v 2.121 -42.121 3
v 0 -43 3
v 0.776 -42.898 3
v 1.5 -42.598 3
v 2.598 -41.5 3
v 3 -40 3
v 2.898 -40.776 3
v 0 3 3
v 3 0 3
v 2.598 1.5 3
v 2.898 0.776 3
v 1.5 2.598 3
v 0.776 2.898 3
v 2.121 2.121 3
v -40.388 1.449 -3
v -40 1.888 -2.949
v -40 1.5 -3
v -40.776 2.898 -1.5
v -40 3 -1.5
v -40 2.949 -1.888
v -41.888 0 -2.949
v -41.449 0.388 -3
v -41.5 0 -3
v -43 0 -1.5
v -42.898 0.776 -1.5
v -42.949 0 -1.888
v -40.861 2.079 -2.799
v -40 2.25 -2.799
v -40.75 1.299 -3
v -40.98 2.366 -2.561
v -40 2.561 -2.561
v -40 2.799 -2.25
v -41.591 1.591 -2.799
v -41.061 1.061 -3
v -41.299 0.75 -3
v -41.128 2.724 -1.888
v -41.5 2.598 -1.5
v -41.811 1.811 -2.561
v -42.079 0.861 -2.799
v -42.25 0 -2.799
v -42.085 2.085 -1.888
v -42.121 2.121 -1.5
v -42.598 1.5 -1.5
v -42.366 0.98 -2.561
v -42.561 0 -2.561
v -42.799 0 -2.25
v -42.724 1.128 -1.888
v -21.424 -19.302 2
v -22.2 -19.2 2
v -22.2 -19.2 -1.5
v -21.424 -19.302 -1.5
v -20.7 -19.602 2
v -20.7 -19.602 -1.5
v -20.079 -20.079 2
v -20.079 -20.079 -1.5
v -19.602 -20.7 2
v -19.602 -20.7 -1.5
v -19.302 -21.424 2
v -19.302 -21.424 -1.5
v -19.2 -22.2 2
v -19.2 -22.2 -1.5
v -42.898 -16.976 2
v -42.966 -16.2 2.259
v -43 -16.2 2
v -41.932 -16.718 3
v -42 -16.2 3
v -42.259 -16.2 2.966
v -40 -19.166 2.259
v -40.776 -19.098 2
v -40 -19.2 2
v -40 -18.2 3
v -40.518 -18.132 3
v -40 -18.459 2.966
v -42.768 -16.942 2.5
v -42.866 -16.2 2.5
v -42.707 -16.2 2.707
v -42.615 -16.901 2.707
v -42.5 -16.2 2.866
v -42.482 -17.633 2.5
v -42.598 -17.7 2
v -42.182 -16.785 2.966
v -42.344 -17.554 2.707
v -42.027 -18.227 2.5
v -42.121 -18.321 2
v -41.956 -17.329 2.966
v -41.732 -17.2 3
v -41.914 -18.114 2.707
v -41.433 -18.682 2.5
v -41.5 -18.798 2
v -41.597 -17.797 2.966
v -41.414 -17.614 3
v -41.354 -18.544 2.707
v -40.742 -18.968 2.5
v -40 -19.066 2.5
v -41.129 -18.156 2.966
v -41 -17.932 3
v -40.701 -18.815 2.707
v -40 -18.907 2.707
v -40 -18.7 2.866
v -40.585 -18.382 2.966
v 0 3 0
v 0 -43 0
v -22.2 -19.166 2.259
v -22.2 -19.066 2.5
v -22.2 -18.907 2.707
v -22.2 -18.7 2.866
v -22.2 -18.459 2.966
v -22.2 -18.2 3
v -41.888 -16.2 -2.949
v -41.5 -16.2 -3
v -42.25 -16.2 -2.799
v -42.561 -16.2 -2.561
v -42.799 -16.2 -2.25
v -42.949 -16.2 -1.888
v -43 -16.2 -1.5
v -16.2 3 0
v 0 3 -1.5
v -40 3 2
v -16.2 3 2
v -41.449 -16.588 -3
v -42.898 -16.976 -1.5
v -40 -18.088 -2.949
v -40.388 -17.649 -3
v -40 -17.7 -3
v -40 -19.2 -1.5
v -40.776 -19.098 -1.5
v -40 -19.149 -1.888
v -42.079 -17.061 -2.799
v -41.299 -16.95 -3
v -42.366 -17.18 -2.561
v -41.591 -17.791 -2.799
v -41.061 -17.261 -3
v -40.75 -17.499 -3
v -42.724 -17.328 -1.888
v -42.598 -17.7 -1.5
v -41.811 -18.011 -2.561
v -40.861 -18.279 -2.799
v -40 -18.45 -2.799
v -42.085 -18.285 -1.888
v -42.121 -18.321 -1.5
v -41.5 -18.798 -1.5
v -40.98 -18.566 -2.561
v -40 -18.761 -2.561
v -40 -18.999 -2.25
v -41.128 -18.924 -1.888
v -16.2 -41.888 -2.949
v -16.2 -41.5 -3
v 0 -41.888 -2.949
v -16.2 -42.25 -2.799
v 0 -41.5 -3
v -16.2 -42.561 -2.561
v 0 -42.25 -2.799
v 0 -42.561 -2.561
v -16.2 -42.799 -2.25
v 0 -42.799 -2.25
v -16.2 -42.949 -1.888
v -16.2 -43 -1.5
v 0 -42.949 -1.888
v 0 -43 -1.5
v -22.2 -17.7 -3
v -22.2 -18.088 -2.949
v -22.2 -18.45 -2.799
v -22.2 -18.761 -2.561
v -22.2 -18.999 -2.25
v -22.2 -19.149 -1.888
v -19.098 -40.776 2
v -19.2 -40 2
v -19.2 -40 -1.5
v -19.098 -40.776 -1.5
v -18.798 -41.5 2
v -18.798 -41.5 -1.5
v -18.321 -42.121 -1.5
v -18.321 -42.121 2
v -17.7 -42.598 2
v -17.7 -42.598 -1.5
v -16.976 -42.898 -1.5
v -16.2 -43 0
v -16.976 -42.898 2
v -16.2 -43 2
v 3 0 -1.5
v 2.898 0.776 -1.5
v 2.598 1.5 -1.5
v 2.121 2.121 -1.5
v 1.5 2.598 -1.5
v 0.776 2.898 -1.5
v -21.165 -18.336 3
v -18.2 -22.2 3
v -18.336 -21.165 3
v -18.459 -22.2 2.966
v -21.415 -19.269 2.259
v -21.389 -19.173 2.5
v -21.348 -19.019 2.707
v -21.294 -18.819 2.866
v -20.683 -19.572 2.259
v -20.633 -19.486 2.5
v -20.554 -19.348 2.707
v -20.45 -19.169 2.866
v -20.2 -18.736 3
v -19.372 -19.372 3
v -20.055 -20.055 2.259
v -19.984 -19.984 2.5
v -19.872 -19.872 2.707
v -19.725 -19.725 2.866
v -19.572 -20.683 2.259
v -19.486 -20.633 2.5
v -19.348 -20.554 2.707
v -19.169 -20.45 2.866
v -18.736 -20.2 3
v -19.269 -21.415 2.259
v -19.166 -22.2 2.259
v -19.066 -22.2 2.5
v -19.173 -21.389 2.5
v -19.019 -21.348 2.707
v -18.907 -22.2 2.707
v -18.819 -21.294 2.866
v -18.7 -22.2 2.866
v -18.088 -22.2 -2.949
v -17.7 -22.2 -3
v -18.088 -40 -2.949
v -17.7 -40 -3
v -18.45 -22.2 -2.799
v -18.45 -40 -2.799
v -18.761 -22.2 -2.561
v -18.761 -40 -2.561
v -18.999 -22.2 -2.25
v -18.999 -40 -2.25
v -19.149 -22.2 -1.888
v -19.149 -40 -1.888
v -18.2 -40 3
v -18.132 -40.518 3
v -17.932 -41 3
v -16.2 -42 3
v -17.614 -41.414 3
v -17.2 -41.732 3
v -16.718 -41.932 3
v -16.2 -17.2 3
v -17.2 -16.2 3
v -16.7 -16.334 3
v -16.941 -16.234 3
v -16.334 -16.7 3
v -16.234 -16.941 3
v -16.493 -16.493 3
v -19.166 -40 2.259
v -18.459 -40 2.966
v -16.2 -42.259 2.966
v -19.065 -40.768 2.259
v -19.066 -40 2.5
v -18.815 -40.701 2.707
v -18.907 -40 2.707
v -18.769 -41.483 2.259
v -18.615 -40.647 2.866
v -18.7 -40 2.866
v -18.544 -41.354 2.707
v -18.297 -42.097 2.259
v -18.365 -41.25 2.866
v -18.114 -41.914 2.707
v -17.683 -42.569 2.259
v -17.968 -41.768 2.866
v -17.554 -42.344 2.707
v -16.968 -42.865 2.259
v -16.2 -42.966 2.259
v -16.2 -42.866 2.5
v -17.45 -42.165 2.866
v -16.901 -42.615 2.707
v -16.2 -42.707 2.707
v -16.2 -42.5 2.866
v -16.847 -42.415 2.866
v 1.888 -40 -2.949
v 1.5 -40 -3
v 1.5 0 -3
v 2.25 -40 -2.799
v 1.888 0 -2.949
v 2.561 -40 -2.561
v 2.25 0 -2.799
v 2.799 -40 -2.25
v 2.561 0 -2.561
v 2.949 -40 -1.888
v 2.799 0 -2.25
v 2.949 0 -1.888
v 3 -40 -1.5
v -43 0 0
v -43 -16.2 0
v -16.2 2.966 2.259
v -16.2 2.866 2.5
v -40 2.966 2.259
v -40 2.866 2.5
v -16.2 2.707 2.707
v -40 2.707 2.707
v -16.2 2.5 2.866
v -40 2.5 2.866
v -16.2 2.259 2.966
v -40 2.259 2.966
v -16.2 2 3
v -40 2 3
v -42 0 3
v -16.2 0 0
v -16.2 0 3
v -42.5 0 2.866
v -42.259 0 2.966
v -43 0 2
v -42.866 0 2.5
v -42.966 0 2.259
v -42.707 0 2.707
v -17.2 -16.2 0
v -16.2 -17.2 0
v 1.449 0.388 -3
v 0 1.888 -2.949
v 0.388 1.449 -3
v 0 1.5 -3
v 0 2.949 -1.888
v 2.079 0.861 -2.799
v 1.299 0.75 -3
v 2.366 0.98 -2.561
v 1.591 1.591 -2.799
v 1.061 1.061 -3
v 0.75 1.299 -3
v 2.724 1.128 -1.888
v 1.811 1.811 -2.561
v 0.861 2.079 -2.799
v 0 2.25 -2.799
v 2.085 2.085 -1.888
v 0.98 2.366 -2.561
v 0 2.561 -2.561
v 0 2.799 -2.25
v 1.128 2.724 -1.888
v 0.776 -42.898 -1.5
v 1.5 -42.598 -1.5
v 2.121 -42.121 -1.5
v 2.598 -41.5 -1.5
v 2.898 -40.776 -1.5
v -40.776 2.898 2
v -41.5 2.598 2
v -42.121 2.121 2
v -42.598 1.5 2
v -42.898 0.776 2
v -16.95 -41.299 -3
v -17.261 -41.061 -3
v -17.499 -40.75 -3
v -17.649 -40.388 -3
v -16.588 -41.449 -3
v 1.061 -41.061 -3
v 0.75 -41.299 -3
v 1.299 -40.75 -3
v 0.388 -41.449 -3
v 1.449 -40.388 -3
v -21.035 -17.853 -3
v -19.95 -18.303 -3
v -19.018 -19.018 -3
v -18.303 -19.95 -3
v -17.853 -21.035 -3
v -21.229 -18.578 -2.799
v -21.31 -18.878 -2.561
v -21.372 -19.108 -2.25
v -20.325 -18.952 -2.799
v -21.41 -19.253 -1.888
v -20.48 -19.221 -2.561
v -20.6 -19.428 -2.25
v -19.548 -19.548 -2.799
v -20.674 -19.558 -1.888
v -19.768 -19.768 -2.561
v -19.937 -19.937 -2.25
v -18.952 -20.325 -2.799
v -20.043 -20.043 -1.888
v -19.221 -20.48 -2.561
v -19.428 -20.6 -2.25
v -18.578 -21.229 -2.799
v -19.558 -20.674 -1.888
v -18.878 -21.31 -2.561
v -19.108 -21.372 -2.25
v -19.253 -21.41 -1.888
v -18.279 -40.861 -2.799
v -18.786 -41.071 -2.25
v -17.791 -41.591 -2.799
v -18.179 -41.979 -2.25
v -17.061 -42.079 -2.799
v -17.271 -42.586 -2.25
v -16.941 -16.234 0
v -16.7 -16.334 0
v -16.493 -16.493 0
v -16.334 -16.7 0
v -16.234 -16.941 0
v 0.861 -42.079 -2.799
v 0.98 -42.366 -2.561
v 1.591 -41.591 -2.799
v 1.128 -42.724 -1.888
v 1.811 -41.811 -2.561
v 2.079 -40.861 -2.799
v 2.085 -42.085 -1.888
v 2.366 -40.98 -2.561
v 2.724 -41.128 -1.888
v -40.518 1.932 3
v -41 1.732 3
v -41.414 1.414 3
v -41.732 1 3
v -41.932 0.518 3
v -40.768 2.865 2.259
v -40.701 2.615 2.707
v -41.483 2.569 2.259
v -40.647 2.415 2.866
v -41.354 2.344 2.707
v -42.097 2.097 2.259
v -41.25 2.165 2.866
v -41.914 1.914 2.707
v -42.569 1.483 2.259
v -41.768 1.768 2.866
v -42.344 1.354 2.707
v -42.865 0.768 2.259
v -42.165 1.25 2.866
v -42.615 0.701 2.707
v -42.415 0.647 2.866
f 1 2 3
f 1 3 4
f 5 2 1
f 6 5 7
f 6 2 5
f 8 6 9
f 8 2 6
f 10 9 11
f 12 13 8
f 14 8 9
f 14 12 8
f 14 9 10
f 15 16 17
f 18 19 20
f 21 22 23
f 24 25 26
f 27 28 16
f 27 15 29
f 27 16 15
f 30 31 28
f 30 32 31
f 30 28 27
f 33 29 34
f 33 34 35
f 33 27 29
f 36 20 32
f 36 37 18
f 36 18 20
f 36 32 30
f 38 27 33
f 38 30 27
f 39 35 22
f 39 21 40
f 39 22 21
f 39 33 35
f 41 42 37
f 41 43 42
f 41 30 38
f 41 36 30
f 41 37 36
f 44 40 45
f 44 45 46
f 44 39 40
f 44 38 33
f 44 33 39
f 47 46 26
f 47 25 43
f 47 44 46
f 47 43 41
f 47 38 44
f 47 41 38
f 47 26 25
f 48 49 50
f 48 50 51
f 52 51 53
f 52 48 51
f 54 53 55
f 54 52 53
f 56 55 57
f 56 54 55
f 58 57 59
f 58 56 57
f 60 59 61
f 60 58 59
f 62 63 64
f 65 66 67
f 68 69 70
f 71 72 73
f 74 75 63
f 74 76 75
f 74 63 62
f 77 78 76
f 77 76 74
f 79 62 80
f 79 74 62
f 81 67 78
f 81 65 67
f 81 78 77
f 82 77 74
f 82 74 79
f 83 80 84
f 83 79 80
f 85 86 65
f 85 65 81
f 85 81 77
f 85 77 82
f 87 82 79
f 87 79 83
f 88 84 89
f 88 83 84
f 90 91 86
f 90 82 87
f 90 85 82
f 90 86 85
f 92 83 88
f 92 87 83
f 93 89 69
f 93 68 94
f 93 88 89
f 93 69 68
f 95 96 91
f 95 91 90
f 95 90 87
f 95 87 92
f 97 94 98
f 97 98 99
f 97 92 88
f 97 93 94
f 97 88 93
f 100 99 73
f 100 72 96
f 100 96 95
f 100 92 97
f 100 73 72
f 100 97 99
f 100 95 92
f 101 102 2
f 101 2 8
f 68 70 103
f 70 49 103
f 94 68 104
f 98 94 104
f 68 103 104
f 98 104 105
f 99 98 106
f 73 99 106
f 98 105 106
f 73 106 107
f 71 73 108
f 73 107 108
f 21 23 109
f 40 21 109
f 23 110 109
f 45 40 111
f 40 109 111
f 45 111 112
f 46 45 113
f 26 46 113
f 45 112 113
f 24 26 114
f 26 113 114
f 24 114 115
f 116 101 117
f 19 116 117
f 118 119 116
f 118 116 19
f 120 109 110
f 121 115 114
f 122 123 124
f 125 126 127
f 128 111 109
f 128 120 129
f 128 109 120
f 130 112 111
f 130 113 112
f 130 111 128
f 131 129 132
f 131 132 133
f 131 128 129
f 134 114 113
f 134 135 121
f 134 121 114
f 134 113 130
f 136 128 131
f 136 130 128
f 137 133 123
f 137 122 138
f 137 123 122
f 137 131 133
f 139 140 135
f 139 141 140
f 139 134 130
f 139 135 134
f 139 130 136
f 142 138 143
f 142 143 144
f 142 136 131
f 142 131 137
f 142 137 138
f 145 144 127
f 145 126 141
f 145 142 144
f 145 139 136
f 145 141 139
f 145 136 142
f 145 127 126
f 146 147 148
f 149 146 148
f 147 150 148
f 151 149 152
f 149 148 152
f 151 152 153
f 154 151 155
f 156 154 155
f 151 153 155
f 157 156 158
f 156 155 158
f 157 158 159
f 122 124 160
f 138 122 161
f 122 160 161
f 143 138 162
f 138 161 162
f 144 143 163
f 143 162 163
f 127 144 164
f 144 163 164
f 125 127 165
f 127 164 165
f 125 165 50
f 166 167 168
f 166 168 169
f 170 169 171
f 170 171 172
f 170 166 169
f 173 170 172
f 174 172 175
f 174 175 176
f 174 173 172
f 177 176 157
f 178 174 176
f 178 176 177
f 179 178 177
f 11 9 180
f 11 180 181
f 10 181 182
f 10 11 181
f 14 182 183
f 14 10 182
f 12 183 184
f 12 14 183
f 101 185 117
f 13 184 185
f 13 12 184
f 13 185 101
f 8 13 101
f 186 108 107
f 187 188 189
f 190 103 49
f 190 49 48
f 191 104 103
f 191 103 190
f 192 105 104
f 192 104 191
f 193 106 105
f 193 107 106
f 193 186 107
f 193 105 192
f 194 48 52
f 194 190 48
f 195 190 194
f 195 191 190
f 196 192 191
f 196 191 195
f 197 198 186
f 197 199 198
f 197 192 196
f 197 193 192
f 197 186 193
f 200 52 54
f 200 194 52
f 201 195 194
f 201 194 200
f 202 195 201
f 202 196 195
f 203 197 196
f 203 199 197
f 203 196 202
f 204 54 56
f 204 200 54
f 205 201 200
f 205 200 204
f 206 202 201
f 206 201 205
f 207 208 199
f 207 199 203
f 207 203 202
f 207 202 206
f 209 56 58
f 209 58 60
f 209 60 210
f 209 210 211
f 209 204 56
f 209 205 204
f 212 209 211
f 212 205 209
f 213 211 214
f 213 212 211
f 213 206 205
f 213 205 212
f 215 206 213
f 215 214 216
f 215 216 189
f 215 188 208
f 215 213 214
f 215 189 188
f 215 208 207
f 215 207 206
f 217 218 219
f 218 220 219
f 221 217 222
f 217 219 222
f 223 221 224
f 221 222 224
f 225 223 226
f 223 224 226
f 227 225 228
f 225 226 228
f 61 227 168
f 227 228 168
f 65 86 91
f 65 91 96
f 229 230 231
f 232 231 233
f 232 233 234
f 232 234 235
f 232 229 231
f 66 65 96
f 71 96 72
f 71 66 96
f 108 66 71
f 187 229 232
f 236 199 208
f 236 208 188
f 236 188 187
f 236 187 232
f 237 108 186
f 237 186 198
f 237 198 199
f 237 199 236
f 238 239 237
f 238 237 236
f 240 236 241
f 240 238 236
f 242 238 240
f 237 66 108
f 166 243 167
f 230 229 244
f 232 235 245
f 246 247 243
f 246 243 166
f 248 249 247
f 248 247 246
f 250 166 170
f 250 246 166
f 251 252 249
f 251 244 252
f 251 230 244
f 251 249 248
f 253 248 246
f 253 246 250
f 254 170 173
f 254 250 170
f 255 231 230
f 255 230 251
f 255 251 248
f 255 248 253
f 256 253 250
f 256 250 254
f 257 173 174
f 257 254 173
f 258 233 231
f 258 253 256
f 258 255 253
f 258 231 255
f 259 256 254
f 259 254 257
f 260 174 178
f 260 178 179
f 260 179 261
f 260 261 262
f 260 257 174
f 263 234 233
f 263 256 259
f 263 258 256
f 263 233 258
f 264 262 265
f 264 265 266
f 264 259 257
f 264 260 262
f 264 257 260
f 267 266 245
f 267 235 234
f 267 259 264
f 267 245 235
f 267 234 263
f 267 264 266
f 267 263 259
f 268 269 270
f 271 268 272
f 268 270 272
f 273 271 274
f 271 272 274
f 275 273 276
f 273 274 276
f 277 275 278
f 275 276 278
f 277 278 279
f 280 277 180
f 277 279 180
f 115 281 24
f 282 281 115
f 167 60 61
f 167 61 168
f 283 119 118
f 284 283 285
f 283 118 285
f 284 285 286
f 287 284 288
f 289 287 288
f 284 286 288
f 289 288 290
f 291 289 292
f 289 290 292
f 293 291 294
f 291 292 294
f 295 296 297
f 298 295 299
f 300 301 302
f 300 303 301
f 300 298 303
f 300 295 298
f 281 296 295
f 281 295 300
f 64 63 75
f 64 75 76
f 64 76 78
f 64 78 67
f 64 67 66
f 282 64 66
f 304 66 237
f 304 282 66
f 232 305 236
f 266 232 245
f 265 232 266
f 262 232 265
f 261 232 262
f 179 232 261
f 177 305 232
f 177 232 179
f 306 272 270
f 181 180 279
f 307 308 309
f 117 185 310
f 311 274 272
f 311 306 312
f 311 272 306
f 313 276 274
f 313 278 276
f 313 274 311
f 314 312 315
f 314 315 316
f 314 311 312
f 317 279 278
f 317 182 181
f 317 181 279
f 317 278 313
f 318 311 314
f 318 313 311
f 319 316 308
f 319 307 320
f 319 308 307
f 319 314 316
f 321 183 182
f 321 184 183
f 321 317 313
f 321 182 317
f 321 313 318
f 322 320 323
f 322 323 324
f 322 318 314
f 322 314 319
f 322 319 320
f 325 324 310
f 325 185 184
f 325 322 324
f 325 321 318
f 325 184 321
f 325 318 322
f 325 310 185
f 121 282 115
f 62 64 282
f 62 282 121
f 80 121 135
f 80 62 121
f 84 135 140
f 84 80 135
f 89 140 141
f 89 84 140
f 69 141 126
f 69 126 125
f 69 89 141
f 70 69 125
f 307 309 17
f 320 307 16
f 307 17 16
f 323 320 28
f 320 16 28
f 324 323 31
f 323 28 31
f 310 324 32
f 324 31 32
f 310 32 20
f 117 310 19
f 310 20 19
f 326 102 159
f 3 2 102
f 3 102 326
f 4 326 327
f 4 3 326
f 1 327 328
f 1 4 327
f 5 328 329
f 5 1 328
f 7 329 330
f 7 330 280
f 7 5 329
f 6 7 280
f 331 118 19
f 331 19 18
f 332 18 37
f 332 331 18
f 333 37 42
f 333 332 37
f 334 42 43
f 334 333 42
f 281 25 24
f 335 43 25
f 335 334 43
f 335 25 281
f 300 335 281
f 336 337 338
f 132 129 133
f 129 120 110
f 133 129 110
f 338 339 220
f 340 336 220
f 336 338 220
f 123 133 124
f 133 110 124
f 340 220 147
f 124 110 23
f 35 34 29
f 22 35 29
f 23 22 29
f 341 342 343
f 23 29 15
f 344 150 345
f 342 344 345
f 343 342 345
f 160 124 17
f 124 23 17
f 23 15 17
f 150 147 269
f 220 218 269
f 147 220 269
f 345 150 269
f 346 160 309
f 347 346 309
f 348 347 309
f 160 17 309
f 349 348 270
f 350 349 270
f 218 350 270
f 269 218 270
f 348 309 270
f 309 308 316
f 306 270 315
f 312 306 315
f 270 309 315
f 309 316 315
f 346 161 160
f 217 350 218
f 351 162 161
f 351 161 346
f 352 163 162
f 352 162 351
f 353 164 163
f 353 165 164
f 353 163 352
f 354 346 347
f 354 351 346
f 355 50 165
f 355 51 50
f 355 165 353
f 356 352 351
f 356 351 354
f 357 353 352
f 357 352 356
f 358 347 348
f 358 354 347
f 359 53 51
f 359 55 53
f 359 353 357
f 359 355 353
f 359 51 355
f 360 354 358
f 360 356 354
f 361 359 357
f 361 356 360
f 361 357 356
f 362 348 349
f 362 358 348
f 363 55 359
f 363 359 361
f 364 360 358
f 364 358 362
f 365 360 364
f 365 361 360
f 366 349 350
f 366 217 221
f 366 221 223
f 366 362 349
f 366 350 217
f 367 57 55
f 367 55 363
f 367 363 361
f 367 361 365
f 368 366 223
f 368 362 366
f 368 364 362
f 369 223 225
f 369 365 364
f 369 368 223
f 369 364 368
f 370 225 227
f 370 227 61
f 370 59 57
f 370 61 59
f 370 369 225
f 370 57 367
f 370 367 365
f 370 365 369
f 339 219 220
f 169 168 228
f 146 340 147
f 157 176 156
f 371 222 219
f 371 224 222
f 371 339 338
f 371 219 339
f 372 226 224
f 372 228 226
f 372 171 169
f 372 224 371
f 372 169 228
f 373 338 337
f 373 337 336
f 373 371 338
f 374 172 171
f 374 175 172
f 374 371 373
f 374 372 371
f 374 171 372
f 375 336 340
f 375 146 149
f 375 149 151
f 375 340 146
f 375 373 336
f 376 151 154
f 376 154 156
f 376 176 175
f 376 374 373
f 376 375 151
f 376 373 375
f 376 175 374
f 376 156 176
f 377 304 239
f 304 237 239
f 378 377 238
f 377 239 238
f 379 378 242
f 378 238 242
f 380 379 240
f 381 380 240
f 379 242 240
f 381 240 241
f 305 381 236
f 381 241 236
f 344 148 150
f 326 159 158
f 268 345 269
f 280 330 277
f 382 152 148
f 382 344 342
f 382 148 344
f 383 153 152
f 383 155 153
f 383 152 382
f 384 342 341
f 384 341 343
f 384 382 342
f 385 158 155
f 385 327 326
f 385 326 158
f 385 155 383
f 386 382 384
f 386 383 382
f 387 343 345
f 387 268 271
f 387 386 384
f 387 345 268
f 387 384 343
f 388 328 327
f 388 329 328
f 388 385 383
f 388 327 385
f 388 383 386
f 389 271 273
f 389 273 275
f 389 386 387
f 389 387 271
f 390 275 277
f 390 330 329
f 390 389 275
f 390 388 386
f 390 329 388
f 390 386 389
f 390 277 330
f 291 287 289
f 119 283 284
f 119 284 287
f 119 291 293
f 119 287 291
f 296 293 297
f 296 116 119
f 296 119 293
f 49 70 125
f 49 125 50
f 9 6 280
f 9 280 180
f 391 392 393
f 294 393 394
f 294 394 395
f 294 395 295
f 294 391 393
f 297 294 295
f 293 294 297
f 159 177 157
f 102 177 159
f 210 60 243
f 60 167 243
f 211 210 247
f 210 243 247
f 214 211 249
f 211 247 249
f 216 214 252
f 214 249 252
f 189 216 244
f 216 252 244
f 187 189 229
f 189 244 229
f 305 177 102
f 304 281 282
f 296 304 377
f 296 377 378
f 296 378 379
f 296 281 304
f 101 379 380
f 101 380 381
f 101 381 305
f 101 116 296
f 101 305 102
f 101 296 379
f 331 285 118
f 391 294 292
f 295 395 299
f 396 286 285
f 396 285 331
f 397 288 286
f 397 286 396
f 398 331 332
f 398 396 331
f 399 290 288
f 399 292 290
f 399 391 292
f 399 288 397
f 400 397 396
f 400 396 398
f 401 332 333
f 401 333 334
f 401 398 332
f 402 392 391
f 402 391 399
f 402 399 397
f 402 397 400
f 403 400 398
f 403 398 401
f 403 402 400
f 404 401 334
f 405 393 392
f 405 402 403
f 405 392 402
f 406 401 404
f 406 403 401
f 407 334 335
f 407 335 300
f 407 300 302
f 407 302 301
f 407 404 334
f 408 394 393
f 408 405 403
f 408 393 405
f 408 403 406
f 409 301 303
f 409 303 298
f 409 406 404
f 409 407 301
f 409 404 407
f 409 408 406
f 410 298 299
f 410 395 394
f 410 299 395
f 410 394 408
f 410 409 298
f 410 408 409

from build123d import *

# Parameters (mm, degrees)
F1_DEPTH = 3
F3_DEPTH = 4
F4_R     = 1.5
F5_R     = 1


with BuildPart() as f1:
    # F0 (on Top) → F1 (new body, symmetric)
    with BuildSketch(Plane.XY):
        with BuildLine():
            Line((3, -40), (3, 0))
            ThreePointArc((3, 0), (2.1213203436, 2.1213203436), (0, 3))
            Line((0, 3), (-40, 3))
            ThreePointArc((-40, 3), (-42.1213203436, 2.1213203436), (-43, 0))
            Line((-43, 0), (-43, -16.2))
            ThreePointArc((-43, -16.2), (-42.1213203436, -18.3213203436), (-40, -19.2))
            Line((-40, -19.2), (-22.2, -19.2))
            ThreePointArc((-22.2, -19.2), (-20.0786796564, -20.0786796564), (-19.2, -22.2))
            Line((-19.2, -22.2), (-19.2, -40))
            ThreePointArc((-19.2, -40), (-18.3213203436, -42.1213203436), (-16.2, -43))
            Line((-16.2, -43), (0, -43))
            ThreePointArc((0, -43), (2.1213203436, -42.1213203436), (3, -40))
        make_face()
    extrude(amount=F1_DEPTH, both=True)

    # F2 (on Top) → F3 (cut)
    with BuildSketch(Plane.XY):
        Polygon((-16.2, 3), (-16.2, 0), (-43, 0), (-43, -16.2), (-16.2, -16.2), (-16.2, -43), (0, -43), (0, -16.2), (0, 0), (0, 3), align=None)
    extrude(amount=F3_DEPTH, mode=Mode.SUBTRACT)

    # F4
    f4_edges = [f1.edges().sort_by_distance(p)[0] for p in [
        (-18.32132, -42.12132, -3),
        (-8.1, -43, -3),
        (2.12132, -42.12132, -3),
        (3, -20, -3),
        (2.12132, 2.12132, -3),
        (-20, 3, -3),
        (-42.12132, 2.12132, -3),
        (-43, -8.1, -3),
        (-42.12132, -18.32132, -3),
        (-31.1, -19.2, -3),
        (-20.07868, -20.07868, -3),
        (-19.2, -31.1, -3),
    ]]
    fillet(f4_edges, radius=F4_R)

    # F5
    f5_edges = [f1.edges().sort_by_distance(p)[0] for p in [
        (-28.1, 3, 3),
        (-19.2, -31.1, 3),
        (-16.2, -16.2, 1.5),
    ]]
    fillet(f5_edges, radius=F5_R)


solid = f1.part
